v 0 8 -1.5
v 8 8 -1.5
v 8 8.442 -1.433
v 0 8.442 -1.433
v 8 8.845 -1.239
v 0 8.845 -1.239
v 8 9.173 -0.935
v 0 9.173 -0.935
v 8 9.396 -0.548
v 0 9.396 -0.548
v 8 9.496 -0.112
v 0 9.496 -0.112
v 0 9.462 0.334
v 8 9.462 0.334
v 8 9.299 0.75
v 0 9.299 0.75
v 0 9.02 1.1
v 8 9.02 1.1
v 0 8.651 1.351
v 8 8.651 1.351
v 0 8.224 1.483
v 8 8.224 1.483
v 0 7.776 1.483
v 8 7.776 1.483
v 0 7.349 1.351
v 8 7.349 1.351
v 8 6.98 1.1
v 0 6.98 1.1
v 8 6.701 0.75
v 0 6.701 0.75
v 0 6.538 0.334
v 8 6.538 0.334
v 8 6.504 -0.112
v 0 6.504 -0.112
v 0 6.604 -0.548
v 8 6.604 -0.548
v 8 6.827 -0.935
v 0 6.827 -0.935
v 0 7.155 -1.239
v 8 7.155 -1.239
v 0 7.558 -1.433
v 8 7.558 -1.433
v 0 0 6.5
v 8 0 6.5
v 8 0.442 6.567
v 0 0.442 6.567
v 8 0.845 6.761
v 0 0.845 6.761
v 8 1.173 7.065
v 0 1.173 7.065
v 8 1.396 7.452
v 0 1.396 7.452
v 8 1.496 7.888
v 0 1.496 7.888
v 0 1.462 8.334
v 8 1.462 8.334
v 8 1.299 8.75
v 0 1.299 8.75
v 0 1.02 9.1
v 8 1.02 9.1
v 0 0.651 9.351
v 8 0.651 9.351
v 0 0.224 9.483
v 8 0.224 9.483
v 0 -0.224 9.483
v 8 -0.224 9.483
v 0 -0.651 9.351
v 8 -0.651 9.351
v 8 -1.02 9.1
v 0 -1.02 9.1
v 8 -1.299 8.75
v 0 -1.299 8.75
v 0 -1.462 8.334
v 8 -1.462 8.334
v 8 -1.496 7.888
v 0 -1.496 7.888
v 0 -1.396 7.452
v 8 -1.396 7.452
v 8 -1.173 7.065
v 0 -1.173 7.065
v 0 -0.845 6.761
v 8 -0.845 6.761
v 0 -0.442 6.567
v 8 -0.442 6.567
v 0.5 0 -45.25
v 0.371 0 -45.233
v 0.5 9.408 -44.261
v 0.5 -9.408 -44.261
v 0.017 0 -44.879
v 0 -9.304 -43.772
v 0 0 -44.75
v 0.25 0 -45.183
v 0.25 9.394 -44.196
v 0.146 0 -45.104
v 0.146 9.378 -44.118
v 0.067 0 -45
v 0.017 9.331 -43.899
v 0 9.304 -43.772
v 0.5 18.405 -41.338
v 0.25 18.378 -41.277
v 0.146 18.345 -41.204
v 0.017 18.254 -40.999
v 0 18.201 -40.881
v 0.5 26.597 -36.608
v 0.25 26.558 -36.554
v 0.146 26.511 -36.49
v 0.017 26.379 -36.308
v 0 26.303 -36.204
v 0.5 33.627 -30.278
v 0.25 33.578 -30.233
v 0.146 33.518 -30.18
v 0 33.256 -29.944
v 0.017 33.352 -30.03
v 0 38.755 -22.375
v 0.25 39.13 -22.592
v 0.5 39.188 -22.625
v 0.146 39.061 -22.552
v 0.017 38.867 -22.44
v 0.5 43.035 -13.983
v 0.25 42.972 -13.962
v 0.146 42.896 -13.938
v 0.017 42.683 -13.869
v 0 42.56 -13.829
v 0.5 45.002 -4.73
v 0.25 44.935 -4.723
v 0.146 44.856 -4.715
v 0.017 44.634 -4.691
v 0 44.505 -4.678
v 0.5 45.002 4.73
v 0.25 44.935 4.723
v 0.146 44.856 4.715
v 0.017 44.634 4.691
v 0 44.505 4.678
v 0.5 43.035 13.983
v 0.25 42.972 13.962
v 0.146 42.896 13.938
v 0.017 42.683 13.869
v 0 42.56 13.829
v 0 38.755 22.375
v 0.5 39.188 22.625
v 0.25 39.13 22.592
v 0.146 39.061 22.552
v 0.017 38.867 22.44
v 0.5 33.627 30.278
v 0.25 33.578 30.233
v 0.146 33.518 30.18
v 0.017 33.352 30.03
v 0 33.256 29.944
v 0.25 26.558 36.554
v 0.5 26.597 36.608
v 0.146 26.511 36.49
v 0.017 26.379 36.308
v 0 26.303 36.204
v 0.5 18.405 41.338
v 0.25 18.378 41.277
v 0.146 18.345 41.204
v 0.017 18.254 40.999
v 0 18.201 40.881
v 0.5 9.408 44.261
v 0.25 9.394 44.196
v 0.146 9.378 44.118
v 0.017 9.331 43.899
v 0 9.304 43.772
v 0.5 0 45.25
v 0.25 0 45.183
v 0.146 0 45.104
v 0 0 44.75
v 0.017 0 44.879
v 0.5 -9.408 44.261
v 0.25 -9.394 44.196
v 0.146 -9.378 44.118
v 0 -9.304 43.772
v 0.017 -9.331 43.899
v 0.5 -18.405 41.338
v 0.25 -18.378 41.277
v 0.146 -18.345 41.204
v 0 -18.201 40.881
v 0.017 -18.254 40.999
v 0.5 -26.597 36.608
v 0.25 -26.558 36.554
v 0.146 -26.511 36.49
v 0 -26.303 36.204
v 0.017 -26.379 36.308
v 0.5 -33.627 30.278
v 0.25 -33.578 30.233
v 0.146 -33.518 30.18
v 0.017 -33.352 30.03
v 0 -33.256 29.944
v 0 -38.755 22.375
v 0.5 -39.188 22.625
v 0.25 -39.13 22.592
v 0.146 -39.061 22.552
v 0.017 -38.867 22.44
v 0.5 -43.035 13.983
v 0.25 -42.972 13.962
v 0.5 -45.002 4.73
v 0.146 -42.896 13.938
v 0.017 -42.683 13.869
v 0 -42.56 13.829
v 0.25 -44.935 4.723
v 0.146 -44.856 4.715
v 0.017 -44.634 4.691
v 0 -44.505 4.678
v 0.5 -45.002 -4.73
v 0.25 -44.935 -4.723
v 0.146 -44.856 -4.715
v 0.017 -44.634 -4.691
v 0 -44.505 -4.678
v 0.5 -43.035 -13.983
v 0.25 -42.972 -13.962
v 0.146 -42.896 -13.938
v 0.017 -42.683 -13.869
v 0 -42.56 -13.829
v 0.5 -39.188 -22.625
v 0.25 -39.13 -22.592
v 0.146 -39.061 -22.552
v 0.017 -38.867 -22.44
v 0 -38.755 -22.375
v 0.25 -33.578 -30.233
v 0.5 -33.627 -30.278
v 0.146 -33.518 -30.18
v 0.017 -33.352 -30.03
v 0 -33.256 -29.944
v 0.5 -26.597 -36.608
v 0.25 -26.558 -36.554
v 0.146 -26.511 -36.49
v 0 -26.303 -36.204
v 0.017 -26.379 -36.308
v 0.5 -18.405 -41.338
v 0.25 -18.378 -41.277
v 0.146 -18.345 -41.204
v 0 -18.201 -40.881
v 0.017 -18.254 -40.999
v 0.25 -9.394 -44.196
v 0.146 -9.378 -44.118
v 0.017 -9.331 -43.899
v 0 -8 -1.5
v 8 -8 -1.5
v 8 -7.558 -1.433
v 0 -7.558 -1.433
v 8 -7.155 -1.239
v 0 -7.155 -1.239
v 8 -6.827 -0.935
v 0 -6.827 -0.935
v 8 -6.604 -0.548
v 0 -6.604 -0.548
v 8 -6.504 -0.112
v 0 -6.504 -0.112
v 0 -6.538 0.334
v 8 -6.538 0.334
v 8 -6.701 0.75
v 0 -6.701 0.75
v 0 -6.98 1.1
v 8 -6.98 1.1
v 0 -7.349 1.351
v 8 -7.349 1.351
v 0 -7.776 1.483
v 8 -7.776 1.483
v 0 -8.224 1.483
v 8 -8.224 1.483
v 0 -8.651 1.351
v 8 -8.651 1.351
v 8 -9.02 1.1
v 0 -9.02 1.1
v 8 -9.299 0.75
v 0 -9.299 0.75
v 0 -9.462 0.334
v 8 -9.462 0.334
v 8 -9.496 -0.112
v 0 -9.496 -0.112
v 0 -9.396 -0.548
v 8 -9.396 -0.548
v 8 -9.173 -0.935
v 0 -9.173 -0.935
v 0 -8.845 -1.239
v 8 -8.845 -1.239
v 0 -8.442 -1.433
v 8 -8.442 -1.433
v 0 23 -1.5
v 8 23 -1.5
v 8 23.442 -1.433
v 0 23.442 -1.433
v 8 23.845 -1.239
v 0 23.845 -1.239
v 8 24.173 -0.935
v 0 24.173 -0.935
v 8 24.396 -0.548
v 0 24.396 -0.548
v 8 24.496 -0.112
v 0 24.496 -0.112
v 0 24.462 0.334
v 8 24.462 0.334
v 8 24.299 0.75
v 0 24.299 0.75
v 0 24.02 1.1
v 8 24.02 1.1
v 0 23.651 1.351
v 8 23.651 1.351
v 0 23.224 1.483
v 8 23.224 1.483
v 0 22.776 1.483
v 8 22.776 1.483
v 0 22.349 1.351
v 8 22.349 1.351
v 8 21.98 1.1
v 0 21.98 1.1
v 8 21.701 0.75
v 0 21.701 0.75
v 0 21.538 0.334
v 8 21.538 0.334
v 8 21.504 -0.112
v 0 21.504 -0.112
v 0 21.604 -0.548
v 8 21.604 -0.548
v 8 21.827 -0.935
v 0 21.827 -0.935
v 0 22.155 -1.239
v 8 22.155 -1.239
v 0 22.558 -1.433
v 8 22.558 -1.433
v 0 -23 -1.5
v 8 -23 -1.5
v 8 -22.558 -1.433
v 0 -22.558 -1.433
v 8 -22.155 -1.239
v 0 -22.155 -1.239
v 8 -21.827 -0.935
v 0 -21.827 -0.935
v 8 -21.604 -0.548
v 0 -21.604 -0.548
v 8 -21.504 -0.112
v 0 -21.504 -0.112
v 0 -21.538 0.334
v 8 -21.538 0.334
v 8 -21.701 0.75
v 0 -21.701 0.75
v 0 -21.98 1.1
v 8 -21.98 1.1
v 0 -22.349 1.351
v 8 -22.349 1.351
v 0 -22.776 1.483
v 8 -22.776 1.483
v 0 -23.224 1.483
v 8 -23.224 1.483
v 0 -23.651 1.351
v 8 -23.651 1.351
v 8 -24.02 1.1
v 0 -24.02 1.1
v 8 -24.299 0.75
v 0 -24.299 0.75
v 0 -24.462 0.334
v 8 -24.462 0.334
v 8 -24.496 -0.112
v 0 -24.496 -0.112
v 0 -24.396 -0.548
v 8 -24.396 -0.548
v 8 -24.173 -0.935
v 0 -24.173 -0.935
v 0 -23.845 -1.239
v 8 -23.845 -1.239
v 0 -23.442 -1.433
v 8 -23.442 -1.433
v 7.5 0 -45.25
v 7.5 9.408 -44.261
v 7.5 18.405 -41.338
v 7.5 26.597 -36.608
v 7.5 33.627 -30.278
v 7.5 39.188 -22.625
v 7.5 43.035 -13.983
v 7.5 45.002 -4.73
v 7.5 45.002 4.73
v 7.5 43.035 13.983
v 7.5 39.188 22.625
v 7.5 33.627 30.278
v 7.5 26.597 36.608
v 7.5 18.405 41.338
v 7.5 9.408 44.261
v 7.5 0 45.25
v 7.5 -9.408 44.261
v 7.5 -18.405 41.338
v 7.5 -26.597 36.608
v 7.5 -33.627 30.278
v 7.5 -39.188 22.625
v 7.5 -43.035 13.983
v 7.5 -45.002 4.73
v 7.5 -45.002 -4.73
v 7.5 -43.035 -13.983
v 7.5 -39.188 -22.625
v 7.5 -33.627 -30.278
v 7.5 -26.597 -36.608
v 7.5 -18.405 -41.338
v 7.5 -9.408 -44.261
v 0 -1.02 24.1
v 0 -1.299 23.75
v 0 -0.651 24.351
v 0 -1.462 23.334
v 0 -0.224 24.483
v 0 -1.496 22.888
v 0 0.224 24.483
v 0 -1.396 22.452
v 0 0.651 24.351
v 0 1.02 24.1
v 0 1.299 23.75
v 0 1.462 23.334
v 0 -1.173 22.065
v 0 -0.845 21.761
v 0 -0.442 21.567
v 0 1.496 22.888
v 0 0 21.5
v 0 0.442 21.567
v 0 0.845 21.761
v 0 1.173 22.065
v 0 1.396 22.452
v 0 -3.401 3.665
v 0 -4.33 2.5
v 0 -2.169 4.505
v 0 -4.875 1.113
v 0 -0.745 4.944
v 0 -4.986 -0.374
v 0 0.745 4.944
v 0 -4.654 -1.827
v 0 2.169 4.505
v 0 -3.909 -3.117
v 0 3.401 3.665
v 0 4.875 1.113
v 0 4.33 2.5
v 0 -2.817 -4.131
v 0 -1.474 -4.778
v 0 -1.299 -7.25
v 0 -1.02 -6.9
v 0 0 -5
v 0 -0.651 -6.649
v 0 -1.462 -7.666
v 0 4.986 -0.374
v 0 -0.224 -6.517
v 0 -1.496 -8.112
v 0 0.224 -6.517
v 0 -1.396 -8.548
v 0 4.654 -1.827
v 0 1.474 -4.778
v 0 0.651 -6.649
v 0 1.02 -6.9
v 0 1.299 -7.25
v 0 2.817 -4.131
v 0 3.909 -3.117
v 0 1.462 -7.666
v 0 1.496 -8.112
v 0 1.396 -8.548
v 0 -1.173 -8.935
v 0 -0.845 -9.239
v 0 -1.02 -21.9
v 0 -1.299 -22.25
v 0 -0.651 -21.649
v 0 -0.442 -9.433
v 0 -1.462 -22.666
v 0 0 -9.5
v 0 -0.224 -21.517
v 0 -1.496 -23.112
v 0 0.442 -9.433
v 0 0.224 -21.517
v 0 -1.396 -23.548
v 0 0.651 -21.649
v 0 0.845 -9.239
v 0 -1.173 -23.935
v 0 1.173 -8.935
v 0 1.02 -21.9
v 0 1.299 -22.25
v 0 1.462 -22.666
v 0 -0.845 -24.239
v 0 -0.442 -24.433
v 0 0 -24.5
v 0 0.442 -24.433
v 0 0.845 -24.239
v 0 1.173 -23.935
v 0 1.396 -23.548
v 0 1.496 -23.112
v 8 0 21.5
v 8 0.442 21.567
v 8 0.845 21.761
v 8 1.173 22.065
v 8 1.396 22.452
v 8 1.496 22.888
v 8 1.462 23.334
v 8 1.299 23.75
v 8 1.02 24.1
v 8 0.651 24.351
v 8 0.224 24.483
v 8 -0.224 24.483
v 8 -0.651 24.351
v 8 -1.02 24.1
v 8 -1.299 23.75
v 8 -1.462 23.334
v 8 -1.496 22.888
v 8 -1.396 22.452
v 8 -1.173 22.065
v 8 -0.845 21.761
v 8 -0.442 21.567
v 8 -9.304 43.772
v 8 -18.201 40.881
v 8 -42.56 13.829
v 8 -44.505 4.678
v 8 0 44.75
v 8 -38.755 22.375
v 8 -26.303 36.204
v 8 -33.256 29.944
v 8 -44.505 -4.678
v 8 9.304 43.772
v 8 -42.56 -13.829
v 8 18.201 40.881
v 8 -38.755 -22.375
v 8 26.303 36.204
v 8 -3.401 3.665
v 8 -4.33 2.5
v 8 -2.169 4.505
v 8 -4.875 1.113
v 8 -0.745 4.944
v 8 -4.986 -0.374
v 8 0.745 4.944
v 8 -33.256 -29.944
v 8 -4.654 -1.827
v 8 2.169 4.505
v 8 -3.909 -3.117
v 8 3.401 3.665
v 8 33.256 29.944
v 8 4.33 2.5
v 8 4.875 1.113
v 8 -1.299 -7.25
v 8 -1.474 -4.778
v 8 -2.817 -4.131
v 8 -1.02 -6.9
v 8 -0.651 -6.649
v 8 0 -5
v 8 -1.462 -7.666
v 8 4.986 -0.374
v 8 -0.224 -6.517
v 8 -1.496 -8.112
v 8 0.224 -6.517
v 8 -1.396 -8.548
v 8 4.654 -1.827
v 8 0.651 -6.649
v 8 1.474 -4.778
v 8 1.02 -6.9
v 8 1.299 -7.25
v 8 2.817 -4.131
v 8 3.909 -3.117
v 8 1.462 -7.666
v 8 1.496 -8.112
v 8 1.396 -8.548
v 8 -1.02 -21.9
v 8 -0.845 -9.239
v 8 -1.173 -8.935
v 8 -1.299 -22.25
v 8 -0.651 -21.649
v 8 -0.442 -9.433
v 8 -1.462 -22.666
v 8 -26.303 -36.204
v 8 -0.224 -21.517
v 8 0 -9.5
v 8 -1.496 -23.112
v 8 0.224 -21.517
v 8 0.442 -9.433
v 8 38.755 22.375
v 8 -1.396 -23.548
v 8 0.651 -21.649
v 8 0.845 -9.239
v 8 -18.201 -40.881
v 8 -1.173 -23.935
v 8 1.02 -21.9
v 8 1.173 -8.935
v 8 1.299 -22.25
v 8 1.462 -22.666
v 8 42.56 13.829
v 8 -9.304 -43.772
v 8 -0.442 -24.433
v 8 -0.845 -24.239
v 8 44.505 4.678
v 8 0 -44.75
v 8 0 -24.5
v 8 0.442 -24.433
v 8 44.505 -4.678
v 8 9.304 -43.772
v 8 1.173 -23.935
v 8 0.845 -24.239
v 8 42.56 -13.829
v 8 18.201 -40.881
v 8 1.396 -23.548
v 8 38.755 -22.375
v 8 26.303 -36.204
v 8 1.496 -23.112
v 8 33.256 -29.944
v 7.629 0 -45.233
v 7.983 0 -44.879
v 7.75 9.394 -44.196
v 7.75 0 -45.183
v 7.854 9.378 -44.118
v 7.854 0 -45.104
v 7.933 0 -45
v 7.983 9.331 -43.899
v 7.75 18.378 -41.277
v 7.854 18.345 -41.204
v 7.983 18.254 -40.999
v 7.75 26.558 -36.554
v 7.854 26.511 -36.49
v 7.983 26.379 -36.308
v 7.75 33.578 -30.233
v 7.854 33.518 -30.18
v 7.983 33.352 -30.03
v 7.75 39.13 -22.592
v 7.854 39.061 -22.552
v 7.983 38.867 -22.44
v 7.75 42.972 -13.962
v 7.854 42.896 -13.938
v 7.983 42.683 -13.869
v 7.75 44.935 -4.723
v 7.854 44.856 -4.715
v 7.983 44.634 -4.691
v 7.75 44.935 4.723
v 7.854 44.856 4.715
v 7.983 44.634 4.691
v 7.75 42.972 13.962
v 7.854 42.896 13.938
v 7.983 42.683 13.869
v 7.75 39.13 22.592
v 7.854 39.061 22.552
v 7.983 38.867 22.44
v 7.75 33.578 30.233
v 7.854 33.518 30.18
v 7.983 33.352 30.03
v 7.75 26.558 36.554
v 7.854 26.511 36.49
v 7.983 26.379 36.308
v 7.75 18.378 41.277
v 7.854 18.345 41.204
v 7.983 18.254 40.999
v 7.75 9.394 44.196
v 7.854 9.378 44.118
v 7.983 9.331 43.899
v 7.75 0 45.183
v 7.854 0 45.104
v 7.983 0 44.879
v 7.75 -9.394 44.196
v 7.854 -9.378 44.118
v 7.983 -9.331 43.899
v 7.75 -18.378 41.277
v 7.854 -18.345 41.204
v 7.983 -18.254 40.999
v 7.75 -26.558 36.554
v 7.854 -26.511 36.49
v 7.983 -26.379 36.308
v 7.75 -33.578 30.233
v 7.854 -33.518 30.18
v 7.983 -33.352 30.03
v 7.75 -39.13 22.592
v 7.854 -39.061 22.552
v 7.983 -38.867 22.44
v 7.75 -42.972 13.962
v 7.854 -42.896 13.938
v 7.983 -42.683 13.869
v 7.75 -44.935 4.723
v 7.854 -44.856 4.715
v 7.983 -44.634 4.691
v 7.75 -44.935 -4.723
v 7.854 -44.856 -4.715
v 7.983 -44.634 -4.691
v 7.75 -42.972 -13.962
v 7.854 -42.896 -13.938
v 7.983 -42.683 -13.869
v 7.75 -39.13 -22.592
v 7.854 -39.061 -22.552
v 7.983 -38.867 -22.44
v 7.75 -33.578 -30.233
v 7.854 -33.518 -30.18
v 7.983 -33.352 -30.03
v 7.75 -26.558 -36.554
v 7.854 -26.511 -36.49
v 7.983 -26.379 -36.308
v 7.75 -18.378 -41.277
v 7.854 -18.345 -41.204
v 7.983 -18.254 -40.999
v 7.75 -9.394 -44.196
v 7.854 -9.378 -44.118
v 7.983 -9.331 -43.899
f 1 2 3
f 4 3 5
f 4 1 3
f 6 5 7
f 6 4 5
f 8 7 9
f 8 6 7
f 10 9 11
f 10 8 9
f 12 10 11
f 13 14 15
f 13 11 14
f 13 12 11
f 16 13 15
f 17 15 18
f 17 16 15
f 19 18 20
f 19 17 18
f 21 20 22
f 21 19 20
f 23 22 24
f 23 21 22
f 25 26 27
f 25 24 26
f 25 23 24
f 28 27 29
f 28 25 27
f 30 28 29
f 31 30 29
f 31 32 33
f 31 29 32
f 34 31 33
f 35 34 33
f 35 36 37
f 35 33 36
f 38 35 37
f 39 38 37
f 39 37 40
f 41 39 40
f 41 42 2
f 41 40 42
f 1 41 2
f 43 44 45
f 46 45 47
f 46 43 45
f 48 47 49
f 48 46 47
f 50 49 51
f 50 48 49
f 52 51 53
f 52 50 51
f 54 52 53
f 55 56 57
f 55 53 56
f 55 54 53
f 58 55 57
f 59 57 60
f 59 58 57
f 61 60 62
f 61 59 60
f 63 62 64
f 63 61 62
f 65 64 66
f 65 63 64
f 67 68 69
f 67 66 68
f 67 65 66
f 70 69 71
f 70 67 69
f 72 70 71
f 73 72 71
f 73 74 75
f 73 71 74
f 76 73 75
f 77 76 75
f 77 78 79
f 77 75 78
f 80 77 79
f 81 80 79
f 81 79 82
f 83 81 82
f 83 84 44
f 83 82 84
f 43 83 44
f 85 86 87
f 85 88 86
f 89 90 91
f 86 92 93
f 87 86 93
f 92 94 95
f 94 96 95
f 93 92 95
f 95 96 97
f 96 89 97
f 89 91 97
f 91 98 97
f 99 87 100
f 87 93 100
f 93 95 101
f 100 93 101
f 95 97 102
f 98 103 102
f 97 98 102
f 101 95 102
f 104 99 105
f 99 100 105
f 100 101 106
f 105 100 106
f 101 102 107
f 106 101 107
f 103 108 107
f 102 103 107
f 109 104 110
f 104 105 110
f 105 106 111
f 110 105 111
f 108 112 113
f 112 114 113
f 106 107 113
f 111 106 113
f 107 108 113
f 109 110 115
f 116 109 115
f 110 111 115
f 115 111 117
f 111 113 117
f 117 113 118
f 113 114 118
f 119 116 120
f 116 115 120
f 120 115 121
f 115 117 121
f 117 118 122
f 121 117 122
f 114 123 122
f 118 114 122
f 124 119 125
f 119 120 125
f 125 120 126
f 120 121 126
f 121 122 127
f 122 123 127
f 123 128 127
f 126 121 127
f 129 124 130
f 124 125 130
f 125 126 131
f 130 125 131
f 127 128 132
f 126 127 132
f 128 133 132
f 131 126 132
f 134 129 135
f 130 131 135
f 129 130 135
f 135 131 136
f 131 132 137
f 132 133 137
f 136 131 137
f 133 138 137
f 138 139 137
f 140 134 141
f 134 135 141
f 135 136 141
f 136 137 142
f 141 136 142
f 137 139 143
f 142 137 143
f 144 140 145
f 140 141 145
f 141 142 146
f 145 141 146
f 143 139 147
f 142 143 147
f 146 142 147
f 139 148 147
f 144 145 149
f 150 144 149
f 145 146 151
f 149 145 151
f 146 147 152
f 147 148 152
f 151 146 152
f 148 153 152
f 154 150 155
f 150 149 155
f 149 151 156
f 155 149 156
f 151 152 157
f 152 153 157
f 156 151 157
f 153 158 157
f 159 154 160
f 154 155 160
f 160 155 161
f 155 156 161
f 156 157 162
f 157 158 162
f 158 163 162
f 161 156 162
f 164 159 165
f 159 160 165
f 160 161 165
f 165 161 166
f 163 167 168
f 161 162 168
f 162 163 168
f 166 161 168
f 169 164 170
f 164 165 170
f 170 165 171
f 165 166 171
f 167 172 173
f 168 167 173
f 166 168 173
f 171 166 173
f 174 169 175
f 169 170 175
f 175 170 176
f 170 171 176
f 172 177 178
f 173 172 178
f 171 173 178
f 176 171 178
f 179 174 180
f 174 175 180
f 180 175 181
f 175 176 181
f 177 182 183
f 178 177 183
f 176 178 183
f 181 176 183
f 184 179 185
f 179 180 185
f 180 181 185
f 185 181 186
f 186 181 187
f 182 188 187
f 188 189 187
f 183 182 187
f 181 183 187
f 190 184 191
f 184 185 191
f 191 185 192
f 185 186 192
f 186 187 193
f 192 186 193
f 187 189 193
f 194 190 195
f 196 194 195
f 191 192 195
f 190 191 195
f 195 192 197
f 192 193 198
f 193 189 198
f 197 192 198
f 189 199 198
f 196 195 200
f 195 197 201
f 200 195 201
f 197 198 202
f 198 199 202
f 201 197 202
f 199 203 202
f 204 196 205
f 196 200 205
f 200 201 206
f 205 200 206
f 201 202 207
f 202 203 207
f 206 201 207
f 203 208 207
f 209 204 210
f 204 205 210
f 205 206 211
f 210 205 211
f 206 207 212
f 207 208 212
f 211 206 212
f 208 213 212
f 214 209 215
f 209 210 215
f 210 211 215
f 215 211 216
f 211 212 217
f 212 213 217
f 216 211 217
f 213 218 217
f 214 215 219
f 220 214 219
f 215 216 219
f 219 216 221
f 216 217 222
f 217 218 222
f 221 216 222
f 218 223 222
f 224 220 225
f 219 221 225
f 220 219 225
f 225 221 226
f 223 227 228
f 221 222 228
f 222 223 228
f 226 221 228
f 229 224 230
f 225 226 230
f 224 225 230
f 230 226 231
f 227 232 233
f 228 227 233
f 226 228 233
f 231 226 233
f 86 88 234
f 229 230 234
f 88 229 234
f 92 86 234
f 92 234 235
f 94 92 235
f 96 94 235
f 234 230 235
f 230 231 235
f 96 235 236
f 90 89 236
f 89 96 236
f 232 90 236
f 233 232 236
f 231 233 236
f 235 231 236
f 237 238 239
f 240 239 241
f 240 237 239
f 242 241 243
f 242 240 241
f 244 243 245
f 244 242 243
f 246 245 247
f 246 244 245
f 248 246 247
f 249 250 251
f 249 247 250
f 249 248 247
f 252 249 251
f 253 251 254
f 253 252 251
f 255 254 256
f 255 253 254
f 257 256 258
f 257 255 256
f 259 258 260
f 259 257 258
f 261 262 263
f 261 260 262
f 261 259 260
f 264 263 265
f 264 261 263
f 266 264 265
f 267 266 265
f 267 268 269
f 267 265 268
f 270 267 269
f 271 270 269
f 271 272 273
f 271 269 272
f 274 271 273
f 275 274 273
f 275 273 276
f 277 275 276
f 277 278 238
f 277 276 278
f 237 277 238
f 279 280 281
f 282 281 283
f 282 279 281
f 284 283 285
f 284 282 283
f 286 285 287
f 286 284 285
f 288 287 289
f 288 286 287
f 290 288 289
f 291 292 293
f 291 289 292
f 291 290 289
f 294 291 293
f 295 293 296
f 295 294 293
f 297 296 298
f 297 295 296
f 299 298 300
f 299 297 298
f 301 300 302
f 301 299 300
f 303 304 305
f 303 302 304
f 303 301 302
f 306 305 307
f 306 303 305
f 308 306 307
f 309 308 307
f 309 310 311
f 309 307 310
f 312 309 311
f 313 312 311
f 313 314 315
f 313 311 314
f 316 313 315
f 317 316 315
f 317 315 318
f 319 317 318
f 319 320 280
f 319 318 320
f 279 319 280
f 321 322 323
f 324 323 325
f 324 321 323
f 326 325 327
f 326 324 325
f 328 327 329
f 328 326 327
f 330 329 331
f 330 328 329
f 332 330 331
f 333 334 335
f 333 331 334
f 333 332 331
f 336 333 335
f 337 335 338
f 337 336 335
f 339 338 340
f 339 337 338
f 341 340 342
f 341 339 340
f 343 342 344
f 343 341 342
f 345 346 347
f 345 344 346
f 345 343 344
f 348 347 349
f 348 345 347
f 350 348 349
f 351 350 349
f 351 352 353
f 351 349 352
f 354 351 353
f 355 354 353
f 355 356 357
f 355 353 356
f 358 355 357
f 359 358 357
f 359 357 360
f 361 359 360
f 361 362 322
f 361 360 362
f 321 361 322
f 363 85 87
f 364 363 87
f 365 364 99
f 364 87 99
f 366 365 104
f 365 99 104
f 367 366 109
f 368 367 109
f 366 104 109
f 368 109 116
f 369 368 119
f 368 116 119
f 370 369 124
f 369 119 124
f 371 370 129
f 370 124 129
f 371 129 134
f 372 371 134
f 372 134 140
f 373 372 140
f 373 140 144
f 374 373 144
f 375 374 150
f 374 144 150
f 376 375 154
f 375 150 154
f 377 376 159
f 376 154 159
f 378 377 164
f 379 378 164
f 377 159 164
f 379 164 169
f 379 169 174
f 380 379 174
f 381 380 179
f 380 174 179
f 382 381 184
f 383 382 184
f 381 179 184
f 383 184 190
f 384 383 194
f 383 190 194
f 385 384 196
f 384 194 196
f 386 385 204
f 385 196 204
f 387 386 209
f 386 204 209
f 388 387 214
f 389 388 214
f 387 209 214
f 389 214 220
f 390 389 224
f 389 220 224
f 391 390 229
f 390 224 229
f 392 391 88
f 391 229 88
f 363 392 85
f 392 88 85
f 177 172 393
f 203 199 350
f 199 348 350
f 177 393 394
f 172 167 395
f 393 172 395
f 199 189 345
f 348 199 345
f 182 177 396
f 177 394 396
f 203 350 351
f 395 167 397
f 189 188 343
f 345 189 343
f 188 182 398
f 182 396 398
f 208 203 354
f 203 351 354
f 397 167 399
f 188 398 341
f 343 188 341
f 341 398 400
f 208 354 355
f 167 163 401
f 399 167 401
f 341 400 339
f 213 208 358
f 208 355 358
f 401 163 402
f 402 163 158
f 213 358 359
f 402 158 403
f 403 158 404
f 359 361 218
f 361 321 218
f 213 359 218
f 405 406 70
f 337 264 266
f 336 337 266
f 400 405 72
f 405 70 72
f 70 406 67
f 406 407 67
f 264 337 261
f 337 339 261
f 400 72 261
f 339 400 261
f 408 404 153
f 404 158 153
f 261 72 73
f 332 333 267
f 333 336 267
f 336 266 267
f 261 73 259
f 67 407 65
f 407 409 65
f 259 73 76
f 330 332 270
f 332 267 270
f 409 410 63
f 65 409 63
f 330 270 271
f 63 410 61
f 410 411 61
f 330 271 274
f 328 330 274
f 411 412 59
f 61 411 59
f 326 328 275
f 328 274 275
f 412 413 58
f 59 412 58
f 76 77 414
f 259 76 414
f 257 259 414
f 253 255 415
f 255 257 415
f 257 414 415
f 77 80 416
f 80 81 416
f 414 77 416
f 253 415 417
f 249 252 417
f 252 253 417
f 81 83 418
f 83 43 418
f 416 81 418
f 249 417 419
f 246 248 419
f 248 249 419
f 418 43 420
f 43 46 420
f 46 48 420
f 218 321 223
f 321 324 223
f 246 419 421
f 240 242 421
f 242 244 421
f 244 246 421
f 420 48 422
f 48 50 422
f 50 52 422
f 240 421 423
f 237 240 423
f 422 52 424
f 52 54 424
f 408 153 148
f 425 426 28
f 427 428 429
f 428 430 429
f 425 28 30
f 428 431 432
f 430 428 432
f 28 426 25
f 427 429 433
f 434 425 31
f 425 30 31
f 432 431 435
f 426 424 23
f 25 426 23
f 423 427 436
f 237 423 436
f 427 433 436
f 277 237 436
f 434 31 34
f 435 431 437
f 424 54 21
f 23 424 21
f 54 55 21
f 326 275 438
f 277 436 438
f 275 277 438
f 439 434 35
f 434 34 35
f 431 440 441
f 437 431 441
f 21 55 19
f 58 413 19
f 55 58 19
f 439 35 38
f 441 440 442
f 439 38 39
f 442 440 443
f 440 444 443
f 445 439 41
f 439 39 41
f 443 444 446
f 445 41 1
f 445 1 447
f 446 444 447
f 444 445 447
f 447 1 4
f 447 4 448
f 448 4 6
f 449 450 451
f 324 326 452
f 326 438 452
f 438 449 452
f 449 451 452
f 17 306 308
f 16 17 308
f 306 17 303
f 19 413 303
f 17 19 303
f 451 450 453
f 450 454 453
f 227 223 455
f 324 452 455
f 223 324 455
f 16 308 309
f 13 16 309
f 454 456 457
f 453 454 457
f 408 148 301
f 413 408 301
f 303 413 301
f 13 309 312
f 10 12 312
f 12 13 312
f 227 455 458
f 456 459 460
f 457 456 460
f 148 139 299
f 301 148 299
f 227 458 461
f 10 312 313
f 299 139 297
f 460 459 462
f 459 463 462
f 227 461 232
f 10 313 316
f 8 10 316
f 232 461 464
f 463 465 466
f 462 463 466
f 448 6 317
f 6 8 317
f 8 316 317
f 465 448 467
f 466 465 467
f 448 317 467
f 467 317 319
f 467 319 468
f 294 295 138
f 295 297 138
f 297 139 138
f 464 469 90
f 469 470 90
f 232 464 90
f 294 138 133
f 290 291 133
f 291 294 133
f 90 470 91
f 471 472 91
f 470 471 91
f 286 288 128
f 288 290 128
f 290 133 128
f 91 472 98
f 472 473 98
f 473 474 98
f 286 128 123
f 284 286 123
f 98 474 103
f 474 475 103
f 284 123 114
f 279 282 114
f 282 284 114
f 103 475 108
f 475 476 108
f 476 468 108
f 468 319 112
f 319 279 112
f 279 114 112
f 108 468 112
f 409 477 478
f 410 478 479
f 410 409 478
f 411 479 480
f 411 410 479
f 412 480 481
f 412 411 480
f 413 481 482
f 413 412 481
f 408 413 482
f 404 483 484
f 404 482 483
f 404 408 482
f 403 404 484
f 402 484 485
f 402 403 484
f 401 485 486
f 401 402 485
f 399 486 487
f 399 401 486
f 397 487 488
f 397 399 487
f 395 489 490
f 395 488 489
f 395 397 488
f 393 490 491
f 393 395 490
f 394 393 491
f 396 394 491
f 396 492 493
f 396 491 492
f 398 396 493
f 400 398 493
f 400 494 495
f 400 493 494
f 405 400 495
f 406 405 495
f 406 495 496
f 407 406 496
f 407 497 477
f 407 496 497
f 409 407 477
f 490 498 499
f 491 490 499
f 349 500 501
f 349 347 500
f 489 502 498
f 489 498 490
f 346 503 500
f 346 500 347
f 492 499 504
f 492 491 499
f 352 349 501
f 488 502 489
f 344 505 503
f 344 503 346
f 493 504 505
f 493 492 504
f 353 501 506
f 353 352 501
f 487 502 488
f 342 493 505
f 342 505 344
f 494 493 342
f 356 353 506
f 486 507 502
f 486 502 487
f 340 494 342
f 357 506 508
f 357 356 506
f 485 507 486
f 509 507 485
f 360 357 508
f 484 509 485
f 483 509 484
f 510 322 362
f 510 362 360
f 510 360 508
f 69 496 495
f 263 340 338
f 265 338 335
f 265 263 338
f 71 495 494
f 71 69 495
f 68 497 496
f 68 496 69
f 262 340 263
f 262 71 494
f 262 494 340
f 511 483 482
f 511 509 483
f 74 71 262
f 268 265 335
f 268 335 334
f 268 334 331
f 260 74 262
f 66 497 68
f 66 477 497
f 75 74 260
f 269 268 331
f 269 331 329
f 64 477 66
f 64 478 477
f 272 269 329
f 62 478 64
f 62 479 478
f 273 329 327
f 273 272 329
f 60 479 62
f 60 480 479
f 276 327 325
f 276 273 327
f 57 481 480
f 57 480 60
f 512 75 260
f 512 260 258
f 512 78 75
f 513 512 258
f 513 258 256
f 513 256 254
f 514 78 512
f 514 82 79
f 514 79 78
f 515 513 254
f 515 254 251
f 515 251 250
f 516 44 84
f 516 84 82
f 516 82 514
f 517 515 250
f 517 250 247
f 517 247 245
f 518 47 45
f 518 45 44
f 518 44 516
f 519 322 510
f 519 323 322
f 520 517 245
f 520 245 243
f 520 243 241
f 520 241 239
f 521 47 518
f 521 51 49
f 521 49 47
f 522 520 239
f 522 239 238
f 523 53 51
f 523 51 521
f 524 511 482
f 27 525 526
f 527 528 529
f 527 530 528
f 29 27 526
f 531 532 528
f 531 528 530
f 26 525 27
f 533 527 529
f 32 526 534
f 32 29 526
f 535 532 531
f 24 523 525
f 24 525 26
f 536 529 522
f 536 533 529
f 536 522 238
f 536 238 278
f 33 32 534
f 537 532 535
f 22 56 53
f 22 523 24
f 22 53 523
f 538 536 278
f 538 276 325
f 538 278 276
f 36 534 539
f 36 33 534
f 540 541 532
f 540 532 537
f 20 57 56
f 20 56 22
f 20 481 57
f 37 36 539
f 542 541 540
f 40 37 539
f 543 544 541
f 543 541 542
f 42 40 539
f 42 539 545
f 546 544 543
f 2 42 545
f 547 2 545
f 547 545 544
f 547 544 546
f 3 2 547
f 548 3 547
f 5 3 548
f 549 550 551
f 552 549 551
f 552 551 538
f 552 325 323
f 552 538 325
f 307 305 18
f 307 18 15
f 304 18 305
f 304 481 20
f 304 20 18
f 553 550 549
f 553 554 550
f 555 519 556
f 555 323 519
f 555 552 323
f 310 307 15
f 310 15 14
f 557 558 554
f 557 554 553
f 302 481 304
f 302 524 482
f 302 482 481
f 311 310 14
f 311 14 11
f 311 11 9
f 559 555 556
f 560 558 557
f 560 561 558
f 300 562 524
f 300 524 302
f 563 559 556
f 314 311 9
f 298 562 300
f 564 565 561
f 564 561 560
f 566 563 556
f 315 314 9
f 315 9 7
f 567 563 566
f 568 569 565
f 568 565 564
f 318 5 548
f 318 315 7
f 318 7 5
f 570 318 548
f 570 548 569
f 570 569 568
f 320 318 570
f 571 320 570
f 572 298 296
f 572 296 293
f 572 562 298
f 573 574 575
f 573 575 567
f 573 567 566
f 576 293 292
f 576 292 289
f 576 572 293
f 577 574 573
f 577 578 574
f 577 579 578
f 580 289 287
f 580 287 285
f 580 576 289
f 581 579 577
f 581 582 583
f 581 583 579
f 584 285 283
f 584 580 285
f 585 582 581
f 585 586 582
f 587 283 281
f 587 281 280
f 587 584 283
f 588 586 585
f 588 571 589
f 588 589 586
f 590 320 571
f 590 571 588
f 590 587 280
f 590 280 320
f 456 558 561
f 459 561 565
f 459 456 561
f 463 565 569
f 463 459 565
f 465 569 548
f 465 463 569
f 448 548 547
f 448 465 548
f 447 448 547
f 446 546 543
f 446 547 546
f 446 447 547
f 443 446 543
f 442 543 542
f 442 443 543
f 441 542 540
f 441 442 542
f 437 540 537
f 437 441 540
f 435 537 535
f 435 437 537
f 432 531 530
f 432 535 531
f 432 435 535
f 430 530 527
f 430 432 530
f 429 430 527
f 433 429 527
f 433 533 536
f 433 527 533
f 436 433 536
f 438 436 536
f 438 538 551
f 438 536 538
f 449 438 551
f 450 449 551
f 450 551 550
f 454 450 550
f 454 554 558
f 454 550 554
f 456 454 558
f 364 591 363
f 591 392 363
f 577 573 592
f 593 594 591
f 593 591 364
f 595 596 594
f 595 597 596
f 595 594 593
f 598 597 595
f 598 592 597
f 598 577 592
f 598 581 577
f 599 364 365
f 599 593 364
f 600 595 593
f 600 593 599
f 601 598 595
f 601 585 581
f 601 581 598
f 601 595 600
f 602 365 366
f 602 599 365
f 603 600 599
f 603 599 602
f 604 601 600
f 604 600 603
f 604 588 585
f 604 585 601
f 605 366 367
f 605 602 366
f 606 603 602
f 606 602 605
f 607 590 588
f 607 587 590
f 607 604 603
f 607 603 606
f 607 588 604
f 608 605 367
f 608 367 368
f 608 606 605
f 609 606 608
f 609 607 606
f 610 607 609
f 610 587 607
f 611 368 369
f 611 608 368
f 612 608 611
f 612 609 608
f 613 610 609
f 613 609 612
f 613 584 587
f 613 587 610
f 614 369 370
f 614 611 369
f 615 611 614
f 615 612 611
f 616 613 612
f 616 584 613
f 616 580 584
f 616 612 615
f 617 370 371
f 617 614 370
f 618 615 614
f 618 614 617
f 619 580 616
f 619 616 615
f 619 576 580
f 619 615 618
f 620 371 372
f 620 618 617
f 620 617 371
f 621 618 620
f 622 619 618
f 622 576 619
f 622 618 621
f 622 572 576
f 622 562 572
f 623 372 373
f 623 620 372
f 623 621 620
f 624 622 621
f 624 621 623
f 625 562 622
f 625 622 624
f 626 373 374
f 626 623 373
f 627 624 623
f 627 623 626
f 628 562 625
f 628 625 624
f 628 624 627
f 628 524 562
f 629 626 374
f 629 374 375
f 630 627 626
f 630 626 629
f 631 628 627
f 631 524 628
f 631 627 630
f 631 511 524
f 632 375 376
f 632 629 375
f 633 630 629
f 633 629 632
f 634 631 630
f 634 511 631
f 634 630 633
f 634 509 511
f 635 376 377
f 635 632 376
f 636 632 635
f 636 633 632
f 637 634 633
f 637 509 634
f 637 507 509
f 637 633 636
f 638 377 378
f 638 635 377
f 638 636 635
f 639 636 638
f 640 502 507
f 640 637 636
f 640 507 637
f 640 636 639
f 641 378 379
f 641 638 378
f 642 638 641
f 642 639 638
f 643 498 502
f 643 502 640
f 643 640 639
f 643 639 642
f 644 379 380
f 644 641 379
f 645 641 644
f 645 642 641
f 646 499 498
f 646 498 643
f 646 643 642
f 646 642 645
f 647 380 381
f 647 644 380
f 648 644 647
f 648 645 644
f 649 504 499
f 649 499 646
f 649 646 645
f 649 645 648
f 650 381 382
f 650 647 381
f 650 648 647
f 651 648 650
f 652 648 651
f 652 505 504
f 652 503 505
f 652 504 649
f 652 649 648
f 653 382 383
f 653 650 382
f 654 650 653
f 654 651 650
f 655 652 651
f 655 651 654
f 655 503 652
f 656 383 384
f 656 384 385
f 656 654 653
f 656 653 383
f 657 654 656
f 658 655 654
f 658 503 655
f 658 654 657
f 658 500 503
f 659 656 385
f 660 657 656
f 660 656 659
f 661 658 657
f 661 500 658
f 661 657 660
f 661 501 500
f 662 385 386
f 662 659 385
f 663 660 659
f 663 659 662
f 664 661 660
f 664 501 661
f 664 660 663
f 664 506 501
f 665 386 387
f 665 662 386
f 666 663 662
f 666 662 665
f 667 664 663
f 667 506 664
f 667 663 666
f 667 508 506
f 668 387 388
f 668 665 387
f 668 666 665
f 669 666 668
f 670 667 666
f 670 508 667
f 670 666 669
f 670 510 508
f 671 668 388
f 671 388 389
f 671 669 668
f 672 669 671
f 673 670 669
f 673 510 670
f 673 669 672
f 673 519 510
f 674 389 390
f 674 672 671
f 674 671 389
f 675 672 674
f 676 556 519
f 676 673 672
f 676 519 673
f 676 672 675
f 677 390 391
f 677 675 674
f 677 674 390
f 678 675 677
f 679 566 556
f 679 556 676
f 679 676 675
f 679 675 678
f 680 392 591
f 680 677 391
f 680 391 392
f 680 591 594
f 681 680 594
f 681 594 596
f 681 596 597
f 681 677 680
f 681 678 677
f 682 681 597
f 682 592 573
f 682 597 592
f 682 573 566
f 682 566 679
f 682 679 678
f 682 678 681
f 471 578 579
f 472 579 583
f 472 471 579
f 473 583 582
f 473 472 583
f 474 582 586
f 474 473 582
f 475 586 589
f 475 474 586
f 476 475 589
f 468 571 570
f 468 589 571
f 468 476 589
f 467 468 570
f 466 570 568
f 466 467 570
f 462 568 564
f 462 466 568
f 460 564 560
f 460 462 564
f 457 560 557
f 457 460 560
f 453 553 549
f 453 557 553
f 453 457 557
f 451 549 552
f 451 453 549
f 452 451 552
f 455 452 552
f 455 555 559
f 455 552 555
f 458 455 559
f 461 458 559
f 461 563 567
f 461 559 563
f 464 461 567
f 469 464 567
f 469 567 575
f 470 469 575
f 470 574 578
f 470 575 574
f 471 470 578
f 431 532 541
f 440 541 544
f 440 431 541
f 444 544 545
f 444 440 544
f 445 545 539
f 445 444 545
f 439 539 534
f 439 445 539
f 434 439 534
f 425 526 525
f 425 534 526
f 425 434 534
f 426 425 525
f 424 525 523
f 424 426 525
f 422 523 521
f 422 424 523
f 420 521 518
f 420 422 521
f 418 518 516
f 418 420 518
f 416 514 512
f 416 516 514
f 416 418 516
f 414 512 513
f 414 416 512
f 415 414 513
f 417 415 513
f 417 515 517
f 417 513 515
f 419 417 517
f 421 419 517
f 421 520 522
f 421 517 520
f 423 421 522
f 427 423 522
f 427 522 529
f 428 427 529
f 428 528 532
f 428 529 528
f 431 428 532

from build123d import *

# Parameters (mm, degrees)
SPROCKET_R                   = 45.25
ESTRUSIONE_ESTRUSIONE2_DEPTH = 8
SCHIZZO1_R                   = 5
SCHIZZO1_R_2                 = 1.5
TAGLIO_ESTRUSIONE2_DEPTH     = 9
RACCORDO1_R                  = 0.5


with BuildPart() as part:
    # Sprocket → Estrusione-Estrusione2 (new body)
    with BuildSketch(Plane(origin=(0, 0, 0), x_dir=(0, 0, -1), z_dir=(1, 0, 0))):
        Circle(SPROCKET_R)
    extrude(amount=ESTRUSIONE_ESTRUSIONE2_DEPTH)

    # Schizzo1 → Taglio-Estrusione2 (cut, through all)
    with BuildSketch(Plane(origin=(0, 0, 0), x_dir=(0, 0, -1), z_dir=(1, 0, 0))):
        Circle(SCHIZZO1_R)
        with Locations((0, 23)):
            Circle(SCHIZZO1_R_2)
        with Locations((8, 0)):
            Circle(SCHIZZO1_R_2)
        with Locations((0, 8)):
            Circle(SCHIZZO1_R_2)
        with Locations((23, 0)):
            Circle(SCHIZZO1_R_2)
        with Locations((0, -8)):
            Circle(SCHIZZO1_R_2)
        with Locations((0, -23)):
            Circle(SCHIZZO1_R_2)
        with Locations((-8, 0)):
            Circle(SCHIZZO1_R_2)
        with Locations((-23, 0)):
            Circle(SCHIZZO1_R_2)
    extrude(amount=TAGLIO_ESTRUSIONE2_DEPTH, mode=Mode.SUBTRACT)

    # Raccordo1
    raccordo1_edges = [part.edges().sort_by_distance(p)[0] for p in [
        (0, 0, 45.25),
        (8, 0, 45.25),
    ]]
    fillet(raccordo1_edges, radius=RACCORDO1_R)


solid = part.part
